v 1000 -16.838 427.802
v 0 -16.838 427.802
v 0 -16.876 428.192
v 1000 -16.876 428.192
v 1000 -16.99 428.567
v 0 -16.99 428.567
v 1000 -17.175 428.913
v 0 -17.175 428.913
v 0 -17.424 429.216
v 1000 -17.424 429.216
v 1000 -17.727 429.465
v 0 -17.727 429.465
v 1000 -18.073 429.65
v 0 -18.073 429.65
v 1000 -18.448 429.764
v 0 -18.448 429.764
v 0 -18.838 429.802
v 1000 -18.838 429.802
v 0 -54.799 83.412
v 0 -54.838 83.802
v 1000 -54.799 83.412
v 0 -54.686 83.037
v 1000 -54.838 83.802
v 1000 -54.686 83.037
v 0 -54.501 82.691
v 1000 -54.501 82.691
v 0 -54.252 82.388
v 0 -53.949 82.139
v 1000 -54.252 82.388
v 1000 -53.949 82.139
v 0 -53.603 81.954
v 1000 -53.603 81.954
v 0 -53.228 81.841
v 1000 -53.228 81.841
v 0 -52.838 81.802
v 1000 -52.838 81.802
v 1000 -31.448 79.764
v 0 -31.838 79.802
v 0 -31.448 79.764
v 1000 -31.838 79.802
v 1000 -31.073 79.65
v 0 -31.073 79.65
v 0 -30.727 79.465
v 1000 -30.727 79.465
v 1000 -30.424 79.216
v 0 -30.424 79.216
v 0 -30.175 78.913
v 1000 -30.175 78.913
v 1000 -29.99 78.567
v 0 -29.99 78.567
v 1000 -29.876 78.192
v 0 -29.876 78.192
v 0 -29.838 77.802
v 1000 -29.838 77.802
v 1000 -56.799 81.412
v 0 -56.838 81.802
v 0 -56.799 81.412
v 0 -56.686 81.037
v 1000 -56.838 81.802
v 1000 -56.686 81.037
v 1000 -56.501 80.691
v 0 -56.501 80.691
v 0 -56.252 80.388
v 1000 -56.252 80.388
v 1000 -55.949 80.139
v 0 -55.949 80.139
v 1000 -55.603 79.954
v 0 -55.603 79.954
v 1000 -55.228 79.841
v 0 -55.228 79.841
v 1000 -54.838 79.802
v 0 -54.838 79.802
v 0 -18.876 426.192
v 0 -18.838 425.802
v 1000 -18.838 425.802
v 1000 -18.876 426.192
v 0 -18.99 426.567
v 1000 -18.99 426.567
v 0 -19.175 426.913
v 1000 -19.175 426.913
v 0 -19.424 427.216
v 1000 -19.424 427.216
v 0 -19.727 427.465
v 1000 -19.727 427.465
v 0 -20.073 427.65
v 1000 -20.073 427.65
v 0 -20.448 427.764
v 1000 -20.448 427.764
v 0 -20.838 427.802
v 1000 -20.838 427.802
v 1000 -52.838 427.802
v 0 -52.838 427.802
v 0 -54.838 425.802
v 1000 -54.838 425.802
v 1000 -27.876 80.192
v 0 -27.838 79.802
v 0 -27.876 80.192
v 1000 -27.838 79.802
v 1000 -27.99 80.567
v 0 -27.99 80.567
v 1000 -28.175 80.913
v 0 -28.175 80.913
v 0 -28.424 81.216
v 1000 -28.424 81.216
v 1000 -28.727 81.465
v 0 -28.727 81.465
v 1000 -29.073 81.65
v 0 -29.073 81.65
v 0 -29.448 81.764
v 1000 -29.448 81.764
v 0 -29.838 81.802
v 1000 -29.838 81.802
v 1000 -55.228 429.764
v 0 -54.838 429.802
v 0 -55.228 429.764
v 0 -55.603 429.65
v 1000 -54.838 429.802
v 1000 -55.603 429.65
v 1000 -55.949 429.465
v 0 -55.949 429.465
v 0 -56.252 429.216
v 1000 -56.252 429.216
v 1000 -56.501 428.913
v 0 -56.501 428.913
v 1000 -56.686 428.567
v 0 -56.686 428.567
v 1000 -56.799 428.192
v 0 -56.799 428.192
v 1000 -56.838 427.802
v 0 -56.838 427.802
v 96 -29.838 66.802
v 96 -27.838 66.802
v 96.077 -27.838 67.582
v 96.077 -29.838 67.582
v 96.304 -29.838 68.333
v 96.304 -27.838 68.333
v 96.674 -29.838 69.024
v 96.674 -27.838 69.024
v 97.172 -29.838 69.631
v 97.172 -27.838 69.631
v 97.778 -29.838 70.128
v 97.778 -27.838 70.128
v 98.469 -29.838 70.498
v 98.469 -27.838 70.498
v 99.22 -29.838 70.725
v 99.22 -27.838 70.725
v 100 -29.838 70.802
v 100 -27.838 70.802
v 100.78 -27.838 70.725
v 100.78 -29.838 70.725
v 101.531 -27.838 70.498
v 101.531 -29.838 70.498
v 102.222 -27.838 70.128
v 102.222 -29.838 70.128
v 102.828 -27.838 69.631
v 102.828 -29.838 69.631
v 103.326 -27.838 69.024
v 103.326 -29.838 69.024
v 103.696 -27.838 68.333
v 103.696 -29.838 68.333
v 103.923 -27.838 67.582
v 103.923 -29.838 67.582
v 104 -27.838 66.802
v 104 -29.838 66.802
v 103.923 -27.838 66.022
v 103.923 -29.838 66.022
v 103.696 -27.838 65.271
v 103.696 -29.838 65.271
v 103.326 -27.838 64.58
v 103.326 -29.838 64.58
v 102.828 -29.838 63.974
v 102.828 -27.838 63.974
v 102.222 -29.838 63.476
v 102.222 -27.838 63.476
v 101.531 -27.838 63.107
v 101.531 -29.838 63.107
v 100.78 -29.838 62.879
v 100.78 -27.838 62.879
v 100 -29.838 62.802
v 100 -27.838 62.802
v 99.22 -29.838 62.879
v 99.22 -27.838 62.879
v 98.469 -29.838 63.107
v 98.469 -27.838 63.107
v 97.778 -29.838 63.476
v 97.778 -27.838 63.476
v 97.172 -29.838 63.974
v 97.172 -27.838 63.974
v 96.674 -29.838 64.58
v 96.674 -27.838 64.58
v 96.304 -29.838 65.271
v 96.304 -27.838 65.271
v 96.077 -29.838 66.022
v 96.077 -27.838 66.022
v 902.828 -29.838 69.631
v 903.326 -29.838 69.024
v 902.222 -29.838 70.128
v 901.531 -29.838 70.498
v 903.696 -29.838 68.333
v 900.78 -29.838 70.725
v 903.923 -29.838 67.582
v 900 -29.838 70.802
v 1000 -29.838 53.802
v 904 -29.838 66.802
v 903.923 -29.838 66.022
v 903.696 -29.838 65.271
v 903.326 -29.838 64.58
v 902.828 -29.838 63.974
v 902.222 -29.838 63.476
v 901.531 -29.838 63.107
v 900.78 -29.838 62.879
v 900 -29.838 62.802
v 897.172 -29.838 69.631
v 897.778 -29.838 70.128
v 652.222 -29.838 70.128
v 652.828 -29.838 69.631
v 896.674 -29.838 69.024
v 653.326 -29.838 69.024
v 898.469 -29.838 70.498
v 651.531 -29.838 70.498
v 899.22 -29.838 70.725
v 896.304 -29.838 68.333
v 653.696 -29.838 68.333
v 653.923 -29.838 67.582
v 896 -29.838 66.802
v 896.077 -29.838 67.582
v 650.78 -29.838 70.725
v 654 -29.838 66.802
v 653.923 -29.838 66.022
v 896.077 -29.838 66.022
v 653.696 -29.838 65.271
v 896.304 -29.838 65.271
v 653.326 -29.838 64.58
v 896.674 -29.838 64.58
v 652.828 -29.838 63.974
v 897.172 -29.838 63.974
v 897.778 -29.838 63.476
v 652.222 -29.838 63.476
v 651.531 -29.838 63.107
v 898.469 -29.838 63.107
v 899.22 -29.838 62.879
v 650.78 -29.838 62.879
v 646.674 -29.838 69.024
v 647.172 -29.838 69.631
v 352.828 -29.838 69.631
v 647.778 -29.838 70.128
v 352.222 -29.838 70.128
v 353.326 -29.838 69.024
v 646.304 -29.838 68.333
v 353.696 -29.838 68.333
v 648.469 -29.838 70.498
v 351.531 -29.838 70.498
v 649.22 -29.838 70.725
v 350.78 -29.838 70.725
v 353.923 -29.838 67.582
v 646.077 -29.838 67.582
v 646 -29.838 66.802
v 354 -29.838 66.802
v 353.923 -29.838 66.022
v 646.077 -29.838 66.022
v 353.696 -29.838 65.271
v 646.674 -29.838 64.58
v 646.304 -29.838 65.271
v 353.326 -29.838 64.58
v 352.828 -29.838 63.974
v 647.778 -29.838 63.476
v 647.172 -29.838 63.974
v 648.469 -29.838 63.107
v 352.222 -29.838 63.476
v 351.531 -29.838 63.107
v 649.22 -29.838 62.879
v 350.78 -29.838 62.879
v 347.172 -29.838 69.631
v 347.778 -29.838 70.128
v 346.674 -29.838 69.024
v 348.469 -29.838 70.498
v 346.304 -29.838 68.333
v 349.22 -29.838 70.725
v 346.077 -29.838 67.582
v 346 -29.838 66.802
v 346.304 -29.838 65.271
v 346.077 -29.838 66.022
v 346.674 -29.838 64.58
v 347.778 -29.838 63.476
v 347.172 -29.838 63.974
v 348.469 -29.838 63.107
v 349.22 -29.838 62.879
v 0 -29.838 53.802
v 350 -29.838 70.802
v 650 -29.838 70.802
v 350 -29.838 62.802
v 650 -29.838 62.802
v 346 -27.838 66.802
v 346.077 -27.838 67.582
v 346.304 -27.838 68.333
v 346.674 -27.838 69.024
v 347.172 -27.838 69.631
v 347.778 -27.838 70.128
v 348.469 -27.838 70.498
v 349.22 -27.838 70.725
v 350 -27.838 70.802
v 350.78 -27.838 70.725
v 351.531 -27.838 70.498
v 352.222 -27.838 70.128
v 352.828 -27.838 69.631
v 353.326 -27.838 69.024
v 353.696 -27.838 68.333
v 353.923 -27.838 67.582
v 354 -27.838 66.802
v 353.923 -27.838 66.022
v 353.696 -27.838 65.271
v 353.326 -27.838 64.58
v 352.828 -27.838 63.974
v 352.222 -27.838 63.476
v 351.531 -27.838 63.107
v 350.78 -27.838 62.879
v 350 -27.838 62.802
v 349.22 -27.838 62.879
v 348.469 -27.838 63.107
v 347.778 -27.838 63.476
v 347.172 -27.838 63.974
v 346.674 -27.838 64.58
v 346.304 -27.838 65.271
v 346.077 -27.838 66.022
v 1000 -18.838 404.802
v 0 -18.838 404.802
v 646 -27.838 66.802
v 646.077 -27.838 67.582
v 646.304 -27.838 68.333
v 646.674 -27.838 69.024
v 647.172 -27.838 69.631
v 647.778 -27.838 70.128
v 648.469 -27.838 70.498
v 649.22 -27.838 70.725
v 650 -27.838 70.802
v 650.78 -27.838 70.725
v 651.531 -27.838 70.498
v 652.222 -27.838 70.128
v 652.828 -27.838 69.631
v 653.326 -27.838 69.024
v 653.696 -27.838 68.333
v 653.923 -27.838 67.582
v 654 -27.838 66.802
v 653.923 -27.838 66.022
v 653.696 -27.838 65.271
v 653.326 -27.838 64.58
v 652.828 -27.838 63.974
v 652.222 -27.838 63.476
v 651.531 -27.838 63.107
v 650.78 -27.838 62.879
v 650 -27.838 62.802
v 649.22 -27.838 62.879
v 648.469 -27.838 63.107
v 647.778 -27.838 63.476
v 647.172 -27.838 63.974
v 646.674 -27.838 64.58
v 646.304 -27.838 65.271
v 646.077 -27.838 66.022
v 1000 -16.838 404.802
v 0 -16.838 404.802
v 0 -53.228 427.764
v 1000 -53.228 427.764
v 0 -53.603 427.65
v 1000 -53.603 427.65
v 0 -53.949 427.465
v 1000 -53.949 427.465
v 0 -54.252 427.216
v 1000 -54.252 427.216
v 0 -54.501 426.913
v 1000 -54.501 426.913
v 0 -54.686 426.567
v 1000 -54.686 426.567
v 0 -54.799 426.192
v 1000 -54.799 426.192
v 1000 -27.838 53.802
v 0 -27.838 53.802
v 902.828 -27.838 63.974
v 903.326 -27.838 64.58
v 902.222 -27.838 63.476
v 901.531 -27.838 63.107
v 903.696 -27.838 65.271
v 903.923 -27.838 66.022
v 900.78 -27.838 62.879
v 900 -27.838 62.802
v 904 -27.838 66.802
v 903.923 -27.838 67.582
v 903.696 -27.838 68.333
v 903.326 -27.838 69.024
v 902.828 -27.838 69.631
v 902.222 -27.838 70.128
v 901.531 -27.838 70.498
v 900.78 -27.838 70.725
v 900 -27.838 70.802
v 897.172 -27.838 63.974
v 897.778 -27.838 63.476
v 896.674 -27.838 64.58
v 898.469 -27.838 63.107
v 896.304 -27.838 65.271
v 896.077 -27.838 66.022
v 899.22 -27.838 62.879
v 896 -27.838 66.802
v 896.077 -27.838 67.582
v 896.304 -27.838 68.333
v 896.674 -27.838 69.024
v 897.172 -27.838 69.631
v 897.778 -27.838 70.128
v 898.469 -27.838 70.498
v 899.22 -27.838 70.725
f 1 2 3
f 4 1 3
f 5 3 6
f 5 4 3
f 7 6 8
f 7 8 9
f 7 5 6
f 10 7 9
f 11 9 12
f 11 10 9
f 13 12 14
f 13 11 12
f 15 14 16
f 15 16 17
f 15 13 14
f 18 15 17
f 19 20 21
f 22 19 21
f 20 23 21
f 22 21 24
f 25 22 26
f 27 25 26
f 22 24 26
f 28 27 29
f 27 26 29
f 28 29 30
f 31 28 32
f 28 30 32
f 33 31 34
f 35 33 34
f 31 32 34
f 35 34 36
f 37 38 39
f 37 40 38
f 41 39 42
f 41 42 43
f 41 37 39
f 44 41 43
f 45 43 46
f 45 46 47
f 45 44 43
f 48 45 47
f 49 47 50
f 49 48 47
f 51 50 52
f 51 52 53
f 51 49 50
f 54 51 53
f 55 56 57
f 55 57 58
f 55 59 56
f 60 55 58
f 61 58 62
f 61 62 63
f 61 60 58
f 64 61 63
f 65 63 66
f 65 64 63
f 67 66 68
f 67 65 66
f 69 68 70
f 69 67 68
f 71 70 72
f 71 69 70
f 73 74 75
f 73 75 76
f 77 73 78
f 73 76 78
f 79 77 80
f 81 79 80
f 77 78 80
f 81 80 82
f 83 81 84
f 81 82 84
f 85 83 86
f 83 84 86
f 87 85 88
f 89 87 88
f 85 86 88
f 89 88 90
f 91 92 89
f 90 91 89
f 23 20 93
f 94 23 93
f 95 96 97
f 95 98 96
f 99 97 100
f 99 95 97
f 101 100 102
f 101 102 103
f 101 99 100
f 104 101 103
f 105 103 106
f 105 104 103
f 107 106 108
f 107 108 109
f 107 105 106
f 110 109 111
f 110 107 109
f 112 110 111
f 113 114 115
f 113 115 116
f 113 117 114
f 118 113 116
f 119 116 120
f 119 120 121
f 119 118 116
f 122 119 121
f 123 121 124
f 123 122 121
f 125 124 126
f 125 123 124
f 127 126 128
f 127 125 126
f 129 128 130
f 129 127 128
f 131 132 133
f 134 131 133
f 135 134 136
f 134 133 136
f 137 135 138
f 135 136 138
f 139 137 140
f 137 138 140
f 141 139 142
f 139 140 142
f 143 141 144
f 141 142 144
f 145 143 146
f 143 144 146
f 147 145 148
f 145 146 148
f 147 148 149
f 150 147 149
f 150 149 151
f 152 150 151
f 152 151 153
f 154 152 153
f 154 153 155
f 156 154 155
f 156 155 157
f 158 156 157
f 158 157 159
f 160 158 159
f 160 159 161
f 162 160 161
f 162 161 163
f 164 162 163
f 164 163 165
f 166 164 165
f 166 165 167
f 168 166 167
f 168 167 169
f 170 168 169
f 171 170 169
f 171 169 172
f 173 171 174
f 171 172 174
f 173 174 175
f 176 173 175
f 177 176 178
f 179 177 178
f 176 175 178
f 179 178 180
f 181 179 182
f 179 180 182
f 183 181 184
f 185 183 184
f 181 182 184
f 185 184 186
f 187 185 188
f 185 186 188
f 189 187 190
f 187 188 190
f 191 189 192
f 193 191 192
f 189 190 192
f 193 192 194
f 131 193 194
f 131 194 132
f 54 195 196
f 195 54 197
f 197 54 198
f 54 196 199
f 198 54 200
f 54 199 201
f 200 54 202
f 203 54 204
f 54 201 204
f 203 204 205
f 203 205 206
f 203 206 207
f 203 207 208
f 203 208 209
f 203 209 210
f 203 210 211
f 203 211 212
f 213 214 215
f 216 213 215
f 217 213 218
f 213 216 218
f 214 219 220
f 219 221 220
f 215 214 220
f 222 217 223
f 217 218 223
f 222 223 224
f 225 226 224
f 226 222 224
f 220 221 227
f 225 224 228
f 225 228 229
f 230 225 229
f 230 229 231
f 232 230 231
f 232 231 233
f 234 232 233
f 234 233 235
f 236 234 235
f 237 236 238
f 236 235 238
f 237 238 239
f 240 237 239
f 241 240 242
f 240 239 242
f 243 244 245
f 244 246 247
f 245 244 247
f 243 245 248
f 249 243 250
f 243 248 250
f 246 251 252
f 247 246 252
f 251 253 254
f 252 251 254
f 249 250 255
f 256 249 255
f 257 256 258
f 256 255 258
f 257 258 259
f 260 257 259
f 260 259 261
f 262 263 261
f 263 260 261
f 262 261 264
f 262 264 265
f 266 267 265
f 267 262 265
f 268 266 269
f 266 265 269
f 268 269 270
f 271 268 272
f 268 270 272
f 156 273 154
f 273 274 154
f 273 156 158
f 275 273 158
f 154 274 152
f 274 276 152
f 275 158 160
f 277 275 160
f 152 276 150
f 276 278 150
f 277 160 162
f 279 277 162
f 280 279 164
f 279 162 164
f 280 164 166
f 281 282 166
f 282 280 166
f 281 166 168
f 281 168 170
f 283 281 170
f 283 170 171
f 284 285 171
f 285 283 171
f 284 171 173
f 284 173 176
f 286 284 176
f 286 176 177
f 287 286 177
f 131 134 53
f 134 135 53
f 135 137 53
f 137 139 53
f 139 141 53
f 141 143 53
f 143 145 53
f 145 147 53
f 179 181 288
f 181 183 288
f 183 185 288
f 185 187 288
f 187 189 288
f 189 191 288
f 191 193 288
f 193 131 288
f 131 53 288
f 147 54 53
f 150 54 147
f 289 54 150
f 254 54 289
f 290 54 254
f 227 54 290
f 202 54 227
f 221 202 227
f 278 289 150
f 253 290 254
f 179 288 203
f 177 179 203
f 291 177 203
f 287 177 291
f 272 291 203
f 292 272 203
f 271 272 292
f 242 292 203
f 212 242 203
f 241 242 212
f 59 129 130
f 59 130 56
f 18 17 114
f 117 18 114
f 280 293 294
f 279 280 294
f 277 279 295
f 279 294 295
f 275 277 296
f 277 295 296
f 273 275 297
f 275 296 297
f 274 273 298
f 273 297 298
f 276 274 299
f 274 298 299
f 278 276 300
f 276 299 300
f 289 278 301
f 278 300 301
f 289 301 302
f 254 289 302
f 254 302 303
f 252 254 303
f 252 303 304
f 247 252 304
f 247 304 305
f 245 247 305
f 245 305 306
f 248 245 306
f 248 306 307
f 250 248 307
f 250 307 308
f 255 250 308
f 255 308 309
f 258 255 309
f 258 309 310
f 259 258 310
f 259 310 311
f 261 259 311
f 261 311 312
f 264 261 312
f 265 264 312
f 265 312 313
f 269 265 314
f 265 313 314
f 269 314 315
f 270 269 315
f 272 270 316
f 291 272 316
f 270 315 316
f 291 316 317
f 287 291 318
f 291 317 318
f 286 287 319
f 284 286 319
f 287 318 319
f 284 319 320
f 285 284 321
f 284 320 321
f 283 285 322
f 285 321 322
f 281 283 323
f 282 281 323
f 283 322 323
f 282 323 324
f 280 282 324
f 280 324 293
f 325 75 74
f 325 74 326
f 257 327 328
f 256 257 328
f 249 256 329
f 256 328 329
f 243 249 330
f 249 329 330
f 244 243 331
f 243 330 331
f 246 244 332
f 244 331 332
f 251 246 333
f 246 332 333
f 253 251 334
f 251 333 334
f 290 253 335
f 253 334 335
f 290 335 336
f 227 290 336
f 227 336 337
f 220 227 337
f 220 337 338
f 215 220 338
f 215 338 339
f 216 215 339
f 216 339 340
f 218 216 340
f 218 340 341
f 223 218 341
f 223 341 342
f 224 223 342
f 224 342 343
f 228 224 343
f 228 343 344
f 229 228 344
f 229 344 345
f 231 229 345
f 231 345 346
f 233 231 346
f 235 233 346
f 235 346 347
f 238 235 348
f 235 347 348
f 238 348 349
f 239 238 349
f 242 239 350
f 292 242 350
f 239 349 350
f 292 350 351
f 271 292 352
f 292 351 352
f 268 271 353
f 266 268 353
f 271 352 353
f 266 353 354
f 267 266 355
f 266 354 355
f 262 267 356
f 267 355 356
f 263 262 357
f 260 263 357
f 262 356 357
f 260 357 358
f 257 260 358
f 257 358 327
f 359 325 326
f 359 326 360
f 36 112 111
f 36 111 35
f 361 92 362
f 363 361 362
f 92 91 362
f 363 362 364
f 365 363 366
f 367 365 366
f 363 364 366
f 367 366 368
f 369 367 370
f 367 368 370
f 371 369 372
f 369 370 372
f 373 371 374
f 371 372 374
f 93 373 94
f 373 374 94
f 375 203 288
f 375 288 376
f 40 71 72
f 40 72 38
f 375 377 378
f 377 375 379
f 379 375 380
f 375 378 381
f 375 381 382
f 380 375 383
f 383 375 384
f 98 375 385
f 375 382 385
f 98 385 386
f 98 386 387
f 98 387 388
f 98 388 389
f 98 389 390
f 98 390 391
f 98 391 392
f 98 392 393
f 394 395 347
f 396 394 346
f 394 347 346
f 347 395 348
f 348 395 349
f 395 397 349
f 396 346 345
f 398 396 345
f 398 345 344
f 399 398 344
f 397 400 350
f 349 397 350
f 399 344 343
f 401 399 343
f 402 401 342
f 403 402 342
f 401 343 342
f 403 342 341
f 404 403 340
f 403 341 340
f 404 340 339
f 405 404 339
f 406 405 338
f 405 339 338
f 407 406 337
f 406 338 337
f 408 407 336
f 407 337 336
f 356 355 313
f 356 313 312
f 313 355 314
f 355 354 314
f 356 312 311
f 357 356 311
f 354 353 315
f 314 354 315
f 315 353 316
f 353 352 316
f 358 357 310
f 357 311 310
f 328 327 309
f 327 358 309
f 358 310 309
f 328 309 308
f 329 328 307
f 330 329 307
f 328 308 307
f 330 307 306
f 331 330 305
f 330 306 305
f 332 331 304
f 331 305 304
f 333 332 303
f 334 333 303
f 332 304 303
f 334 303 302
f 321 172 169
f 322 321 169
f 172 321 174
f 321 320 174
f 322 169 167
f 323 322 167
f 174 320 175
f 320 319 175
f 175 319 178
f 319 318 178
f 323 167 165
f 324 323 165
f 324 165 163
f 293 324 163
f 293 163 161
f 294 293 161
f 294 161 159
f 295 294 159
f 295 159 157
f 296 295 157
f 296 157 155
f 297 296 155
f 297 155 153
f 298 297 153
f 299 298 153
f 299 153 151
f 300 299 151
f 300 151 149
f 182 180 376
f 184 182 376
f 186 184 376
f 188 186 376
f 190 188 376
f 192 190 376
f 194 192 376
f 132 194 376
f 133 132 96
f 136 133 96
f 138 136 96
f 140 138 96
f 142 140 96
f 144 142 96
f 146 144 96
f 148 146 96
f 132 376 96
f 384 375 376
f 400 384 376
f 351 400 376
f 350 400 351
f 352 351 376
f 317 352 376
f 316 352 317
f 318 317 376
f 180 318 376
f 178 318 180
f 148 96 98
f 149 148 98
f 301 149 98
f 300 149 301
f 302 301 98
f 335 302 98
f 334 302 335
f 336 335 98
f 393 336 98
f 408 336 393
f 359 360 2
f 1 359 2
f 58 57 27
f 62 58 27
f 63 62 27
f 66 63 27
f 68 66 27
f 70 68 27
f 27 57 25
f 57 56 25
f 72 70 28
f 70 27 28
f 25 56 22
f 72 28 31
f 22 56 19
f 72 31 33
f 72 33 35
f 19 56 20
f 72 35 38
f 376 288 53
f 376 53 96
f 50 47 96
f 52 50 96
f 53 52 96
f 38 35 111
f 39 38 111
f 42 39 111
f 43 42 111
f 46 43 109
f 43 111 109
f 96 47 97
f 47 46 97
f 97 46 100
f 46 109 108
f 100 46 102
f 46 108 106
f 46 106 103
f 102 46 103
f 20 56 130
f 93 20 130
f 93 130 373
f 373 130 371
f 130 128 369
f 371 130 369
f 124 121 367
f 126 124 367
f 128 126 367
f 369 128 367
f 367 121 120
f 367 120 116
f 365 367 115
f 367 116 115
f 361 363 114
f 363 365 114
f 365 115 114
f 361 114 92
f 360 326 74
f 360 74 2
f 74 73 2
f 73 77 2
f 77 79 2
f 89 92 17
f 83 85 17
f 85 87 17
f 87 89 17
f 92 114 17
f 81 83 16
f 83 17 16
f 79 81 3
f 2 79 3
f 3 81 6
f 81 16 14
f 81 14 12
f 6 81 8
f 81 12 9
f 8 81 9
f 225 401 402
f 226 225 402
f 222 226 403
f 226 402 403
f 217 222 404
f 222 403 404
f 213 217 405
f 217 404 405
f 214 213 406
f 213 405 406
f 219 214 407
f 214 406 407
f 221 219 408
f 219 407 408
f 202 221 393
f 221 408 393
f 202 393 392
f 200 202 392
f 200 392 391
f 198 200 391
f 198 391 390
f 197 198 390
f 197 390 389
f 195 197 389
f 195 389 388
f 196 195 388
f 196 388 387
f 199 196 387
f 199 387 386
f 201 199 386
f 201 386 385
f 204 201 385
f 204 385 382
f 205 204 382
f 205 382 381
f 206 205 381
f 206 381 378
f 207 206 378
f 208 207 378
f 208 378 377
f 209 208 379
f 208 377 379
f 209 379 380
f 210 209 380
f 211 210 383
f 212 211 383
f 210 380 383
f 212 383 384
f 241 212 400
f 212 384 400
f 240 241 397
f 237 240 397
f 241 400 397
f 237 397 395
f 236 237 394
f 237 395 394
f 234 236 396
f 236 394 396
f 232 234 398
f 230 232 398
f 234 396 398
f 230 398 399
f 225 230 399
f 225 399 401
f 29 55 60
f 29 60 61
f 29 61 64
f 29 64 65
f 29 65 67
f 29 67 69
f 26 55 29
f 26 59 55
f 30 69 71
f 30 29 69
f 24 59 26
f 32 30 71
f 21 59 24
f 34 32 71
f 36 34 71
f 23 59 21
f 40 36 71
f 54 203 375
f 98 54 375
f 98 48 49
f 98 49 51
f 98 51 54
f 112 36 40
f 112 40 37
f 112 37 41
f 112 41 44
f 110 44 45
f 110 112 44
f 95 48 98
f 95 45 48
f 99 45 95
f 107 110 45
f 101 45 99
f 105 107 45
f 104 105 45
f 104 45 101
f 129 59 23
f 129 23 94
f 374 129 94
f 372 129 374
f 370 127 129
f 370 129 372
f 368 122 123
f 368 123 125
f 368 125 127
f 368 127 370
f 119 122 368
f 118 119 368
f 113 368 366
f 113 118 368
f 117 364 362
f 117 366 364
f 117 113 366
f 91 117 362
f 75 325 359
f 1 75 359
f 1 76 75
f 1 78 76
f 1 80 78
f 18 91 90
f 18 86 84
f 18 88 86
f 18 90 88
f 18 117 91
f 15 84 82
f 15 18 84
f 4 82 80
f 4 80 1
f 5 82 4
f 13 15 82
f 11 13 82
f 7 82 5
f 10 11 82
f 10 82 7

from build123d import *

# Parameters (mm, degrees)
F1_DEPTH = 1000
F3_D     = 8
F4_R     = 2


# Not quite as in the source:
# - a feature names something its author has since deleted; it is built from what else it names


with BuildPart() as f1:
    # F0 (on Right) → F1 (new body)
    with BuildSketch(Plane.YZ):
        Polygon((-18.8378913403, 427.8021101952), (-18.8378913403, 404.8021101952), (-16.8378913403, 404.8021101952), (-16.8378913403, 429.8021101952), (-56.8378913403, 429.8021101952), (-56.8378913403, 79.8021101952), (-29.8378913403, 79.8021101952), (-29.8378913403, 53.8021101952), (-27.8378913403, 53.8021101952), (-27.8378913403, 81.8021101952), (-54.8378913403, 81.8021101952), (-54.8378913403, 427.8021101952), align=None)
    extrude(amount=F1_DEPTH)

    # F3 (through all)
    with Locations(Plane.XZ.offset(29.8378913403)):
        with Locations((350, 66.8021101952), (650, 66.8021101952), (900, 66.8021101952), (100, 66.8021101952)):
            Hole(F3_D / 2)

    # F4
    f4_edges = [f1.edges().sort_by_distance(p)[0] for p in [
        (500, -56.837891, 429.80211),
        (500, -16.837891, 429.80211),
        (500, -56.837891, 79.80211),
        (500, -27.837891, 81.80211),
        (500, -54.837891, 81.80211),
        (500, -29.837891, 79.80211),
        (500, -18.837891, 427.80211),
        (500, -54.837891, 427.80211),
    ]]
    fillet(f4_edges, radius=F4_R)


solid = f1.part
